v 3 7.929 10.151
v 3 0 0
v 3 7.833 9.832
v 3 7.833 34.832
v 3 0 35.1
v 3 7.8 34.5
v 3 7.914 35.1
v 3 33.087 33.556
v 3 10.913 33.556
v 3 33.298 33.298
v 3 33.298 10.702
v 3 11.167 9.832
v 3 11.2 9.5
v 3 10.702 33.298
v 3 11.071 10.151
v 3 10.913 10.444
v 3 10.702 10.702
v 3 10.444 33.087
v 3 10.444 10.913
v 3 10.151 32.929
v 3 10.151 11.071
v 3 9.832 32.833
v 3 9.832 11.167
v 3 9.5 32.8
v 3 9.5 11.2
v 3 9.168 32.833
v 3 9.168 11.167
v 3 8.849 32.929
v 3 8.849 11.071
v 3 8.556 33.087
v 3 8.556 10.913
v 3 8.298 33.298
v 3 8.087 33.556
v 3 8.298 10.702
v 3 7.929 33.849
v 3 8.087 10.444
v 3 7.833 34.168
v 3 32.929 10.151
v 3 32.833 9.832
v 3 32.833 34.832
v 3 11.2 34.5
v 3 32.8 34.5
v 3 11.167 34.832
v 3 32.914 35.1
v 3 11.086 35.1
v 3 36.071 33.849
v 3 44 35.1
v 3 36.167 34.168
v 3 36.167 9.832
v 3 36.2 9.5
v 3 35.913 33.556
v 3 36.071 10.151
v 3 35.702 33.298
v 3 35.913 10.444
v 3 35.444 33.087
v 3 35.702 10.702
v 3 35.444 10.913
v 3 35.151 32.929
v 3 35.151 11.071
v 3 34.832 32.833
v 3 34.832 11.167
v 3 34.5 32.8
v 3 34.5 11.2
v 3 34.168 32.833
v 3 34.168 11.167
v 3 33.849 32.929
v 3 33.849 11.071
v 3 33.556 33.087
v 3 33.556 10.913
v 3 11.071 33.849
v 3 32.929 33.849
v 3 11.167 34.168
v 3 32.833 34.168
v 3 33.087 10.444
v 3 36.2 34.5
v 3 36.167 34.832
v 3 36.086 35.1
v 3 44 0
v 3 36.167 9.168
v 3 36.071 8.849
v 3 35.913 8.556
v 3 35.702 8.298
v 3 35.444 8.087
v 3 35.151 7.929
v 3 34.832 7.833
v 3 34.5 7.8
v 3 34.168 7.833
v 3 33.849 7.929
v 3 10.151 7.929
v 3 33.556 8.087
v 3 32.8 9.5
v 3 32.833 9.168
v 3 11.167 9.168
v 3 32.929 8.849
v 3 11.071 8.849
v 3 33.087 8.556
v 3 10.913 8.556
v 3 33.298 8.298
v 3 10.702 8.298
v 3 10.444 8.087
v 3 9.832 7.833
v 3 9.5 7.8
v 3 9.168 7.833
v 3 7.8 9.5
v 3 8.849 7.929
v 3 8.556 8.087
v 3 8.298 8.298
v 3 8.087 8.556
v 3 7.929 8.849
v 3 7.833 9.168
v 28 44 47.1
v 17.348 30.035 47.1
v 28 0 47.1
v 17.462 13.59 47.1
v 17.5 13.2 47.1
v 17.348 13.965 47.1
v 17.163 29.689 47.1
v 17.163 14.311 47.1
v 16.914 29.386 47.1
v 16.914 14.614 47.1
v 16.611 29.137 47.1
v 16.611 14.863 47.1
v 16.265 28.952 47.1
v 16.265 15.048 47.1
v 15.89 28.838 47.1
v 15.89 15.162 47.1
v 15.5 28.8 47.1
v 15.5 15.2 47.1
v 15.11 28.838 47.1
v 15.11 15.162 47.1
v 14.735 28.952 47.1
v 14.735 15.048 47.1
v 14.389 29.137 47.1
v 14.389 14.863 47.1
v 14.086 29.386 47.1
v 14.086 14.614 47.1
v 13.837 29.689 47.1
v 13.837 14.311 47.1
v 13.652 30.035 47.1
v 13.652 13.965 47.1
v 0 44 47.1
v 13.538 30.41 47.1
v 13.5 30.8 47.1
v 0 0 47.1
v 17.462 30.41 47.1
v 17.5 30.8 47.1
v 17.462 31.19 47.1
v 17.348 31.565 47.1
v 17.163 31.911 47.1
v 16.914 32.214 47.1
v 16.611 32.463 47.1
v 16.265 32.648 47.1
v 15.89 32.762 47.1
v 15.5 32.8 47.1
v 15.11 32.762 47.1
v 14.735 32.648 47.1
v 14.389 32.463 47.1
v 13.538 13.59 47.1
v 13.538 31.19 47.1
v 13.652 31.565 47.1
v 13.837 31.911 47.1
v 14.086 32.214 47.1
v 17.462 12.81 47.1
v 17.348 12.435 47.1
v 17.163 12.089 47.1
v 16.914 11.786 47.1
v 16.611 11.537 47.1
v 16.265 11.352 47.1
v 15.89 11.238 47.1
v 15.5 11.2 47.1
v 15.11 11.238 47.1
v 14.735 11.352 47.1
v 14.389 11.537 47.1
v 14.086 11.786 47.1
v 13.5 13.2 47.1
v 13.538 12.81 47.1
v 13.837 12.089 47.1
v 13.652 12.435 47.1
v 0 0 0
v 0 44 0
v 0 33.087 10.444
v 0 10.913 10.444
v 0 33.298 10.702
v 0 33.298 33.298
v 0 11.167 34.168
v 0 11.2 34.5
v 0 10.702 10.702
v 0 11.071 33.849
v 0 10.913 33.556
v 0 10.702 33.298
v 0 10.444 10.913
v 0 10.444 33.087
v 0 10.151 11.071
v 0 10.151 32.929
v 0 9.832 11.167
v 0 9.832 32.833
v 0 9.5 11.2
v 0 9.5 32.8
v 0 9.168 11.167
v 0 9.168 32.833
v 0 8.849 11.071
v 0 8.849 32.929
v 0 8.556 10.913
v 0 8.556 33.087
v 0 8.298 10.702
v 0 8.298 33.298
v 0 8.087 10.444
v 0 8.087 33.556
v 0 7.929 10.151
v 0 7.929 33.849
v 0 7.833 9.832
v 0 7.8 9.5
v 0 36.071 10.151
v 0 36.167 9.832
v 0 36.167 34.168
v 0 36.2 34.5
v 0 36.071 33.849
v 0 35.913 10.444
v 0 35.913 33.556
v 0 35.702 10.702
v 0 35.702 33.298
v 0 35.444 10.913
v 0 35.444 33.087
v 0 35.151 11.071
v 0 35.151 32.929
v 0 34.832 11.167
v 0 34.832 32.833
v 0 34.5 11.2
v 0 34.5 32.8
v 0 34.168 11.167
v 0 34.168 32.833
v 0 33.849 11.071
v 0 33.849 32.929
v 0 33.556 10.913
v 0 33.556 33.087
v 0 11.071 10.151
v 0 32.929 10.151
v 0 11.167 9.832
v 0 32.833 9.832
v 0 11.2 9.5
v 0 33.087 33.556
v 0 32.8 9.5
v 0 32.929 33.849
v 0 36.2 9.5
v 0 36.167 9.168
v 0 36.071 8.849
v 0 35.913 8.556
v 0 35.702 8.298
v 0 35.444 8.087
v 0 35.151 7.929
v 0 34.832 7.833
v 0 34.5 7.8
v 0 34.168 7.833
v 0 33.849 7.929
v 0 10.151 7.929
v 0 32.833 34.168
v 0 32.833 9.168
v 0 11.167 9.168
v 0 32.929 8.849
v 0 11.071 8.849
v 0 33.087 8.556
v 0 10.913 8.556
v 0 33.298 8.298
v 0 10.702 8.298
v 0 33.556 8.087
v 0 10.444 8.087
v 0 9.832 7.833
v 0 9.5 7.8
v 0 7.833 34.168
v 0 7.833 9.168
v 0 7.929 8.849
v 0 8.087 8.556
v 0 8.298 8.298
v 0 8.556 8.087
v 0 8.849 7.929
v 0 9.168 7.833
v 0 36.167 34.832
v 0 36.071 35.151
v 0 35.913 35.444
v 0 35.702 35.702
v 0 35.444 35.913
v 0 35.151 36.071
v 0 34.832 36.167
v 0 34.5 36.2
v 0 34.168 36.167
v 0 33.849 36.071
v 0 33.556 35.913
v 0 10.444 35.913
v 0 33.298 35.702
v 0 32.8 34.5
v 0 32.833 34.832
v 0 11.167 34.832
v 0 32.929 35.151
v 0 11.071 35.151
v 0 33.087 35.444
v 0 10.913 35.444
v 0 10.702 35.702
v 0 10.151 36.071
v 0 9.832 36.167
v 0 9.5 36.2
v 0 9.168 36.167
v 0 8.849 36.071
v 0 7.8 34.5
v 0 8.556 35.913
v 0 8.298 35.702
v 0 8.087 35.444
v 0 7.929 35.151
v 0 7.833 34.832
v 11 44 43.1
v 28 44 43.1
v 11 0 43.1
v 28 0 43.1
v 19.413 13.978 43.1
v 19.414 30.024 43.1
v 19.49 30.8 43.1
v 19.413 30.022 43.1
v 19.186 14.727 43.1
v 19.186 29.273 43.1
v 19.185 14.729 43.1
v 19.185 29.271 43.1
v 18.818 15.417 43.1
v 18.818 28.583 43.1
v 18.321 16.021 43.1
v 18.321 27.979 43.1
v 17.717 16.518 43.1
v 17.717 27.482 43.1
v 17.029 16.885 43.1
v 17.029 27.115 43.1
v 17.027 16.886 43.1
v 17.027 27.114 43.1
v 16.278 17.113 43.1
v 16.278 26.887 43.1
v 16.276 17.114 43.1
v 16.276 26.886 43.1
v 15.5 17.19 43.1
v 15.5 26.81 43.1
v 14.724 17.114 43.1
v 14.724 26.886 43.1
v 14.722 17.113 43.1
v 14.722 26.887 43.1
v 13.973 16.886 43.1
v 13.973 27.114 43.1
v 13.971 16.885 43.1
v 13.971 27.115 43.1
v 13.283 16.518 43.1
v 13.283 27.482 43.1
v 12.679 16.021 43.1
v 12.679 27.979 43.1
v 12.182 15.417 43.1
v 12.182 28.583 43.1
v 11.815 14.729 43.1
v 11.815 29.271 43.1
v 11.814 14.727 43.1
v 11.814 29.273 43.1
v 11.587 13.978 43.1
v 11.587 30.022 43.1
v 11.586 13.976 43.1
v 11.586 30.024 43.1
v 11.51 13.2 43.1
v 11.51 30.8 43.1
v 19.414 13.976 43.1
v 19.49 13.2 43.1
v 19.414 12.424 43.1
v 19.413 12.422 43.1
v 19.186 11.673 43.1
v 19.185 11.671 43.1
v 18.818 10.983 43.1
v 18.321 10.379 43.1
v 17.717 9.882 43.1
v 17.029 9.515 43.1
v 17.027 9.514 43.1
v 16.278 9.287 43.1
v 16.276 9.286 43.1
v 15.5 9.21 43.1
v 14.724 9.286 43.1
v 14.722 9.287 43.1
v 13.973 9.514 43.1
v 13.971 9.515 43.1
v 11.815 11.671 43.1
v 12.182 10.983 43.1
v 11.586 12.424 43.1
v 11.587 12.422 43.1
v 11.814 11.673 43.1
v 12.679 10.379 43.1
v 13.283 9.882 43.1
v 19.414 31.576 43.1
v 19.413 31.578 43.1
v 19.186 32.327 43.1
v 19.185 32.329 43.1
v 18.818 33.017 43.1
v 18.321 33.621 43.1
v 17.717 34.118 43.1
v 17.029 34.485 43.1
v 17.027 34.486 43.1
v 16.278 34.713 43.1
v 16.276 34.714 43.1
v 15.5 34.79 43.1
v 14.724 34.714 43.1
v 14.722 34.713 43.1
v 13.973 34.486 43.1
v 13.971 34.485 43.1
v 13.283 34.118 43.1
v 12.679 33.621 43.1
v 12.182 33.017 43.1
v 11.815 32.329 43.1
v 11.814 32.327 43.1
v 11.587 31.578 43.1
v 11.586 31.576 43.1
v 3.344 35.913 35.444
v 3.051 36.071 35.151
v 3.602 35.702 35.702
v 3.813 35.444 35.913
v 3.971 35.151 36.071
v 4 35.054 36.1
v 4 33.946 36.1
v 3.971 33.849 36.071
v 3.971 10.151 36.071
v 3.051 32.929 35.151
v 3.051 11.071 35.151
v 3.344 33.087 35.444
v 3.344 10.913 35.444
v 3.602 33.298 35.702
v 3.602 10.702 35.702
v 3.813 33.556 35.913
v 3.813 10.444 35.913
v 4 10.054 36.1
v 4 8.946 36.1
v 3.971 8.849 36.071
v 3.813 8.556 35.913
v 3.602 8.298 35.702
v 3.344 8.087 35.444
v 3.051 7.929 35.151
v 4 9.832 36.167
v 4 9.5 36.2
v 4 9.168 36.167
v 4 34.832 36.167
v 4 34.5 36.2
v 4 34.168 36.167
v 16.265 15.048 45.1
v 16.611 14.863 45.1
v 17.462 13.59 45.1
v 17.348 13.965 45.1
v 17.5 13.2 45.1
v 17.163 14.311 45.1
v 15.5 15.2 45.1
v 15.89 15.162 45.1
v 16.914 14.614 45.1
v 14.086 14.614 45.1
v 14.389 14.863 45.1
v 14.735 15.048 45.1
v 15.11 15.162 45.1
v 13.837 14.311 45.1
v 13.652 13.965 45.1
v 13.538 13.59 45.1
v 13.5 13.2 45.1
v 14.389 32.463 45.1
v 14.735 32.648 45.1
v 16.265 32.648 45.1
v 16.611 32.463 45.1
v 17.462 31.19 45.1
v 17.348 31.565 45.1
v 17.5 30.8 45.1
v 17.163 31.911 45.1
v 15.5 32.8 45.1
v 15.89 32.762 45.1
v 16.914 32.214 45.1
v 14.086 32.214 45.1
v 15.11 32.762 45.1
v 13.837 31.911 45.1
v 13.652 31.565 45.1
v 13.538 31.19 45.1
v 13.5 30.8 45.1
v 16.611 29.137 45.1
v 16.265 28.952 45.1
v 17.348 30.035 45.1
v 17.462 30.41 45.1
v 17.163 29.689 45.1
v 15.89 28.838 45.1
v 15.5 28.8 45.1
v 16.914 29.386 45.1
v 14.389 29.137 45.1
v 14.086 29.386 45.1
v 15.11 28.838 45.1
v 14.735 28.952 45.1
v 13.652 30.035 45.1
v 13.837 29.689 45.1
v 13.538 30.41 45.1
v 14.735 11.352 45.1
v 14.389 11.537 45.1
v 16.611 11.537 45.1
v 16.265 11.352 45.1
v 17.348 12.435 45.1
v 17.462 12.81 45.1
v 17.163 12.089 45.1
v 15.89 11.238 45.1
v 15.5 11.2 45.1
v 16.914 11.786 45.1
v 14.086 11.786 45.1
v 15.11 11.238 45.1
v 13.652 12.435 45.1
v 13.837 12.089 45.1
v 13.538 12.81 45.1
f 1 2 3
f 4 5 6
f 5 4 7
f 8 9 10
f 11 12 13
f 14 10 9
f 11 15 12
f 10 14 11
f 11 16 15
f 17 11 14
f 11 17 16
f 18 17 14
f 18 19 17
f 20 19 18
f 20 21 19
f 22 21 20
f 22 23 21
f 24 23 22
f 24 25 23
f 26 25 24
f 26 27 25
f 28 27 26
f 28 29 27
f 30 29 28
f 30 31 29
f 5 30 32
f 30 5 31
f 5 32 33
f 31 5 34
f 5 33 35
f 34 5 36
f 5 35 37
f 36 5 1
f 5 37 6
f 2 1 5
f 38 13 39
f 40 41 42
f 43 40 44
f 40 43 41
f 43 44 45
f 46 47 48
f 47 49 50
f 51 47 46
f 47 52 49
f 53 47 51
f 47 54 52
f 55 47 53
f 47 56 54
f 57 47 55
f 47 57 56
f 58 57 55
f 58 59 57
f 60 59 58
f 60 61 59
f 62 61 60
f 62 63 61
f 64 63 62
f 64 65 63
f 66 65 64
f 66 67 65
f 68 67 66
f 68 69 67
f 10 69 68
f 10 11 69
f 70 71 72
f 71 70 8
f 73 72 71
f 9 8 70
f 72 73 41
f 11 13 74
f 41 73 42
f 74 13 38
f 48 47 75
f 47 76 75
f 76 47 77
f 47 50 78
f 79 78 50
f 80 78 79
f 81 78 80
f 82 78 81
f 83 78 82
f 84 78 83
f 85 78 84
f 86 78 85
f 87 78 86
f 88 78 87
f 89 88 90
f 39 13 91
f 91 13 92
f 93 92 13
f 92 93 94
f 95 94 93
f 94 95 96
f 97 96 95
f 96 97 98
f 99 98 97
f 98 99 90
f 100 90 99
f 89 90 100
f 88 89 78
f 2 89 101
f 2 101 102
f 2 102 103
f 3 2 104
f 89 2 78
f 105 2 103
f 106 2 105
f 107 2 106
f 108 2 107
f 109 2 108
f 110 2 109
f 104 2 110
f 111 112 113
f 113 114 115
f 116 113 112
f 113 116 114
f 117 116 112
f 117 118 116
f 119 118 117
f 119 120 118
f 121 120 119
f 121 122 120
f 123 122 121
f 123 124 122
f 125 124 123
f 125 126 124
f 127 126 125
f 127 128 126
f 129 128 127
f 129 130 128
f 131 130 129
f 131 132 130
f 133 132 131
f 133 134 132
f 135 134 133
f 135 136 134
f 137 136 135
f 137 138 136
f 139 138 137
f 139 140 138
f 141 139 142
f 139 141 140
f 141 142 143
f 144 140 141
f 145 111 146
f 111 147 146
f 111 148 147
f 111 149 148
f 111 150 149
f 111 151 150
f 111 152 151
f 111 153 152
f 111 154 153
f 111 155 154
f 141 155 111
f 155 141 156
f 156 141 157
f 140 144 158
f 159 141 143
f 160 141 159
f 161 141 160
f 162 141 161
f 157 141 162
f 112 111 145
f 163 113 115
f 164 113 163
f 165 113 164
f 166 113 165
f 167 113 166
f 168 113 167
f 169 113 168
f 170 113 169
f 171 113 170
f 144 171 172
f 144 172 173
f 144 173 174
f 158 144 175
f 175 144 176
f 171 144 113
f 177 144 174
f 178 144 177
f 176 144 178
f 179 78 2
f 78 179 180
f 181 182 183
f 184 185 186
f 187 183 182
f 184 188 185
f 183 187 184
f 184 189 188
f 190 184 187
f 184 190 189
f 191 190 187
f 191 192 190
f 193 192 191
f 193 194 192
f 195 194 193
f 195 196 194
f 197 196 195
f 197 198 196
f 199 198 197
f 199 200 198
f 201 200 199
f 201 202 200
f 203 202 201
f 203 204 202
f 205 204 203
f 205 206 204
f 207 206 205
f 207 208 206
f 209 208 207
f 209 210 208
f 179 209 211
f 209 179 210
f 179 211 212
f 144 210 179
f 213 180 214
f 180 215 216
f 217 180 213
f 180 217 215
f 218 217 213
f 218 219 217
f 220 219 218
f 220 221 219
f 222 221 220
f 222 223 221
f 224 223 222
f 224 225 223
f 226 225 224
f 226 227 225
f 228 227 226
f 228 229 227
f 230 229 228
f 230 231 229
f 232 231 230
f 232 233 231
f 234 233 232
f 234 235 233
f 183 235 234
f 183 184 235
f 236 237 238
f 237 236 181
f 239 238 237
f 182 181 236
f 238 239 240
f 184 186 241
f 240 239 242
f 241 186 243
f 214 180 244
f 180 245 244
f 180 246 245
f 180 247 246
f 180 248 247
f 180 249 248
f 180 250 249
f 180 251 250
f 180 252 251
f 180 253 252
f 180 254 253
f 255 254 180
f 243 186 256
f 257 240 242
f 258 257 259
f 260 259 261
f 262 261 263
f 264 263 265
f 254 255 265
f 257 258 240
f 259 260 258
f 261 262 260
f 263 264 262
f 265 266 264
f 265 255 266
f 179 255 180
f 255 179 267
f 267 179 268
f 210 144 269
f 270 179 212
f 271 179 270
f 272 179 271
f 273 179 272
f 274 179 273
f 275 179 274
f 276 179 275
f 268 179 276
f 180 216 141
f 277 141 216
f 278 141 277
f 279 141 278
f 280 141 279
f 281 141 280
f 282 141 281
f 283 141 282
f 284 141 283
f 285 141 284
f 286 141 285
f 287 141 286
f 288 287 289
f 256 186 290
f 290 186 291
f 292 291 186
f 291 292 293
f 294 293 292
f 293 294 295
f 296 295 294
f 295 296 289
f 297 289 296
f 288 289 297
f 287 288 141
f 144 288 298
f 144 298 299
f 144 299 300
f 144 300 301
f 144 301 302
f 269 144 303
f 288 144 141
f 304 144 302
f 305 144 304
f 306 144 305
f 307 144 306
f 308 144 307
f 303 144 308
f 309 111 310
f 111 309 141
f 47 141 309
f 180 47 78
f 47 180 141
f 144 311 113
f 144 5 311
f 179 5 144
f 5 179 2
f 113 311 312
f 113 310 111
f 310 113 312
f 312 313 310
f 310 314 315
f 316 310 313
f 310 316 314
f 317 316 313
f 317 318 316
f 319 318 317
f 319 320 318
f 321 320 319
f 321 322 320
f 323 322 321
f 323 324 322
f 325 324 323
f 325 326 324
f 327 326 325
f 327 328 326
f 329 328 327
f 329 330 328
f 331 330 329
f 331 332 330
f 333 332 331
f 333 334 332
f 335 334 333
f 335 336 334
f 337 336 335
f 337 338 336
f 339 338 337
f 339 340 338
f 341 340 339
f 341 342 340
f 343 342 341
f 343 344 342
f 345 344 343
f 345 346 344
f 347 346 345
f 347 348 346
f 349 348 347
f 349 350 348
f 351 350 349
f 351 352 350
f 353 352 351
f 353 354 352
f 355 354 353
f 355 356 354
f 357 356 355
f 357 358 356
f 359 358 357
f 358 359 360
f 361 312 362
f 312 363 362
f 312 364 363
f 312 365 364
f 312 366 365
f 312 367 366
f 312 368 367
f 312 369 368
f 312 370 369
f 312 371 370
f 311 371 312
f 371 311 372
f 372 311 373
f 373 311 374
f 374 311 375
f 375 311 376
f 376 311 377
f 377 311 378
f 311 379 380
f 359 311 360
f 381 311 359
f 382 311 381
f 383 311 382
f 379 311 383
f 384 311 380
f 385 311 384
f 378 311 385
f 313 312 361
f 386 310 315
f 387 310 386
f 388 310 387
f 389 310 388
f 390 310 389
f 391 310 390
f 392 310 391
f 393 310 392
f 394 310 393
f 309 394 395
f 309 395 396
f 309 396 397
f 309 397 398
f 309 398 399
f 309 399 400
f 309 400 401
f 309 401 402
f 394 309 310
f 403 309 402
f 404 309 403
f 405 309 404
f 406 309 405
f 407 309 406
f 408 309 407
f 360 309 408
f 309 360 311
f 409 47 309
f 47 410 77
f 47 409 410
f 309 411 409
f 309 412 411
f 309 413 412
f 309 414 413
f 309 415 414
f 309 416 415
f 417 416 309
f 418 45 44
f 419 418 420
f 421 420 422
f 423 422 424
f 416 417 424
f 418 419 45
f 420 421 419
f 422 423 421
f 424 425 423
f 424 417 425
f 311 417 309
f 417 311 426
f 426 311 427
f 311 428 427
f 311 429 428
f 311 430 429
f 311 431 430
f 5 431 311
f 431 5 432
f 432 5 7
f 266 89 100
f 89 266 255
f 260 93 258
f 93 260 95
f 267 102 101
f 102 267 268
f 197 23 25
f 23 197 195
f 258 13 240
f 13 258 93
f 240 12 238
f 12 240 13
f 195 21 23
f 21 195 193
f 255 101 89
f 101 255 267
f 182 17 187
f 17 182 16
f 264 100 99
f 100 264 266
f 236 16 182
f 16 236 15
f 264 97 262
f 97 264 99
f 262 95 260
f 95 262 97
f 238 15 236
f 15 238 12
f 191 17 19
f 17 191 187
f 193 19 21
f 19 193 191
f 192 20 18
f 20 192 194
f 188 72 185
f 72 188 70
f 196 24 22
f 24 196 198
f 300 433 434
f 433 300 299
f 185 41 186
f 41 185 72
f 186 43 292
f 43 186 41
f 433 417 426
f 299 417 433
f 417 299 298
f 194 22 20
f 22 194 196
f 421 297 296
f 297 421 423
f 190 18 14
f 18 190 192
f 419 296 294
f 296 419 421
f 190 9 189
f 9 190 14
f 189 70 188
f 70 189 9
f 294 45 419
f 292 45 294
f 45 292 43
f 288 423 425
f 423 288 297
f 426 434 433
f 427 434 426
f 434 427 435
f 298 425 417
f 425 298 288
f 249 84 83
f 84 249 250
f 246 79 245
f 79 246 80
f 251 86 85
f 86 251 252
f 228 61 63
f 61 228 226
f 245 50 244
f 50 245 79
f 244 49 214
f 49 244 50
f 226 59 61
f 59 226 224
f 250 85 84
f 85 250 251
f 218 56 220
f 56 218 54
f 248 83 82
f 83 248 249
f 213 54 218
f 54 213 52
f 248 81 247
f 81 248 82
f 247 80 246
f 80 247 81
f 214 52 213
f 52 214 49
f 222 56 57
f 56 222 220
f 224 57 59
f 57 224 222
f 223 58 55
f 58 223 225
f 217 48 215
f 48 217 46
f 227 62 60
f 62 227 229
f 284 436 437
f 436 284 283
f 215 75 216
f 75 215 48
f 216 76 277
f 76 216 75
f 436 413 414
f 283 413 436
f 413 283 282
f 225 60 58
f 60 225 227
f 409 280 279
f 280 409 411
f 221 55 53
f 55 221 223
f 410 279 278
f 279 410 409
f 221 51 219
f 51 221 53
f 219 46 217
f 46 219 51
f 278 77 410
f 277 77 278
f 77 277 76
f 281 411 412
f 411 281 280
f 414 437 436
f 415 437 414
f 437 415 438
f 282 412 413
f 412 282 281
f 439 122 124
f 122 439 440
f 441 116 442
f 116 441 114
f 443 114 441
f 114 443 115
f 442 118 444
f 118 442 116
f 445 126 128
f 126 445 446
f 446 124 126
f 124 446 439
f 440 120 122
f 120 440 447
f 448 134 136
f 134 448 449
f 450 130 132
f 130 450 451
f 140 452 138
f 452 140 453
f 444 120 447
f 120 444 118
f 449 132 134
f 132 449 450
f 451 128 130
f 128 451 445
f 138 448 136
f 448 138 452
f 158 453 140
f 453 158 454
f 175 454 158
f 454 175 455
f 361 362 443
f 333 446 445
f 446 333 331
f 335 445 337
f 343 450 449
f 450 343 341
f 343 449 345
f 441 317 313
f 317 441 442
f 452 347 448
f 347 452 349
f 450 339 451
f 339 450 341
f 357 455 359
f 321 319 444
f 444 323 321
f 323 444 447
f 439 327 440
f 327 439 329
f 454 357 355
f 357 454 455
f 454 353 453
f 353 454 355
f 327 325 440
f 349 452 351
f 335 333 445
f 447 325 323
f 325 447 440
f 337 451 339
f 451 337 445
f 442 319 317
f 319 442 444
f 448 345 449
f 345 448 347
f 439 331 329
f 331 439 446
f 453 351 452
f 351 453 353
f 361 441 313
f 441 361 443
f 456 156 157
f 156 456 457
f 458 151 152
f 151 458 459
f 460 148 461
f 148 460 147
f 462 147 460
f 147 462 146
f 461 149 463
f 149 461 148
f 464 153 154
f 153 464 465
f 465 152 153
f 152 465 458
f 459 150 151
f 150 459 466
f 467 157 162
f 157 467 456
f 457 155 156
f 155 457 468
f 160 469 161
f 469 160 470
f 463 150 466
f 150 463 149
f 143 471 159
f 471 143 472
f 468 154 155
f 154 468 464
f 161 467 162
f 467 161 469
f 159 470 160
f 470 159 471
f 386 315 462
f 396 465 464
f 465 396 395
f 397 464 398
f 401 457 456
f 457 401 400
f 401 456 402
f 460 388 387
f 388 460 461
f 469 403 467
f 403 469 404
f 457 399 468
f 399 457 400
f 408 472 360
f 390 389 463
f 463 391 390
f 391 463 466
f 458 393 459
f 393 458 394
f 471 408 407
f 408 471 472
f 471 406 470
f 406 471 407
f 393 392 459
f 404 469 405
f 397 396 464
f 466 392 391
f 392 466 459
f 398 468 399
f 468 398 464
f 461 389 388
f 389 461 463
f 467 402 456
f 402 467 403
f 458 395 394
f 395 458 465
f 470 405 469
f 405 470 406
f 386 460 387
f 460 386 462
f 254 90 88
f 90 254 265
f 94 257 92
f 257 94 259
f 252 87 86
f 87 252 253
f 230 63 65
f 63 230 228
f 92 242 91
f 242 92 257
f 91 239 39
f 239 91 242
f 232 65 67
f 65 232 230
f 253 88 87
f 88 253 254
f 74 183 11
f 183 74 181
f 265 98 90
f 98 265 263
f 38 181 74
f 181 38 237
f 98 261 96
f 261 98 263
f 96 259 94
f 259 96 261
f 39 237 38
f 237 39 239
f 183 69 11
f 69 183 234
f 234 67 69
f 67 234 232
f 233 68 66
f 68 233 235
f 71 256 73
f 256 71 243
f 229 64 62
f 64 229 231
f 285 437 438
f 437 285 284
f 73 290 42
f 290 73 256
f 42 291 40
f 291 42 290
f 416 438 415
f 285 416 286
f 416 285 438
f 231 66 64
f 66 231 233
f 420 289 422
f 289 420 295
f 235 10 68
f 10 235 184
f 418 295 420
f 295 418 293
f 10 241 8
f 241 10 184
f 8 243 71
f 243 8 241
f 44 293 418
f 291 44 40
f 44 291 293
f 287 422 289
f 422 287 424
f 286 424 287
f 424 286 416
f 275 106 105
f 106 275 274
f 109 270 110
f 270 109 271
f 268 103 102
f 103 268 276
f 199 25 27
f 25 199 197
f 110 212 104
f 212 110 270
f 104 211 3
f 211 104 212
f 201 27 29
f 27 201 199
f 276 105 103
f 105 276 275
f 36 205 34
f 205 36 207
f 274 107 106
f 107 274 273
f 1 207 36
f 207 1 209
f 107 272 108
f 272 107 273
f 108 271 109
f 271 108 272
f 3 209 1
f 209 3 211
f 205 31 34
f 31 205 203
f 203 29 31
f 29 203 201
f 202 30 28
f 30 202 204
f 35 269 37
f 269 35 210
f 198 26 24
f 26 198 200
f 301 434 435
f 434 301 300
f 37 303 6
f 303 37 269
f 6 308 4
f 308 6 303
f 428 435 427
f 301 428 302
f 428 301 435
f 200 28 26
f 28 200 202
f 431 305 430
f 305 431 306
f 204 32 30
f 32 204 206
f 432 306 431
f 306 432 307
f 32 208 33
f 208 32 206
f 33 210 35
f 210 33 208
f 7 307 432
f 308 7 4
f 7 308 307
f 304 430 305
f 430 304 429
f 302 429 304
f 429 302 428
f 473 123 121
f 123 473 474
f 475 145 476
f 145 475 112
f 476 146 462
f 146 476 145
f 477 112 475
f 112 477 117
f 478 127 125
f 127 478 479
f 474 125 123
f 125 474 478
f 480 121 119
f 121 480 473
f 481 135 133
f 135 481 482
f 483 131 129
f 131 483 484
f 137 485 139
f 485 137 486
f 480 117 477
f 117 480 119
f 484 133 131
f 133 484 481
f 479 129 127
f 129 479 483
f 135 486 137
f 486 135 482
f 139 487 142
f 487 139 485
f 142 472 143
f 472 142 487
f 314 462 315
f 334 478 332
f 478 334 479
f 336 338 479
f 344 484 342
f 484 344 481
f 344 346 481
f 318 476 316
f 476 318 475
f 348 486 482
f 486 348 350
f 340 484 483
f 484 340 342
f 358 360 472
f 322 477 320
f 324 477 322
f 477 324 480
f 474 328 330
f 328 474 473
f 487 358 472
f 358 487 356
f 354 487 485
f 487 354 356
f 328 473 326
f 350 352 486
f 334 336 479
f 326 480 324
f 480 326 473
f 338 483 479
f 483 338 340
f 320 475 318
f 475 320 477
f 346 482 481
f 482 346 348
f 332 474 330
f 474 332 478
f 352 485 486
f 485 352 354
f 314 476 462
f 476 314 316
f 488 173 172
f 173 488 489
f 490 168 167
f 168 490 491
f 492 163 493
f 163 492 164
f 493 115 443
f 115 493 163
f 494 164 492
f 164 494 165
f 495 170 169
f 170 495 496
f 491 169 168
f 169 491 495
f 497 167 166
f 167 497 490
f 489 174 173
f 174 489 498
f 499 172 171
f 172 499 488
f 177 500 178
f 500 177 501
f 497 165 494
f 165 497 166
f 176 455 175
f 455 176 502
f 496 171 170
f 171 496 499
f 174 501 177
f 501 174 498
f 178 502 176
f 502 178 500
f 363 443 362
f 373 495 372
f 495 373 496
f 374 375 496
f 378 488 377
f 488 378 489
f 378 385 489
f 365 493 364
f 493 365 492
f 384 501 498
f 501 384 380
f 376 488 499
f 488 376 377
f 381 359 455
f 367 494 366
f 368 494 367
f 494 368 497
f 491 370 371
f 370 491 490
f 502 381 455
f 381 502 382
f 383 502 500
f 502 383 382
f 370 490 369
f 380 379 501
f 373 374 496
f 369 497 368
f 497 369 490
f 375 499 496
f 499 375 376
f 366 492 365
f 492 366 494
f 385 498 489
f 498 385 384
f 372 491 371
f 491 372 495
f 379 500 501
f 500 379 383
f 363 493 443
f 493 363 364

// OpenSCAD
// SPDX-License-Identifier: CC-BY-NC-SA-4.0
use <../css610-underdesk-mount.scad>;

// Data asserts verify device dimensions.
assert(len(_css610_side_holes()) == 4, "CSS610 side pattern = 4 holes");
assert(_css610_size()[2] == 47.1, "CSS610 height (flange datum)");

// Task 2 (#59): bracket geometry contract checks. `use` doesn't import
// variables (only modules/functions, see reference_openscad_gotchas) -- the
// module-parameter values below (_leg_len, _H, _standoff, _leg_thickness,
// _flange_len, _flange_thickness, _mount_hole) are regression-lock literals
// that must match css610-underdesk-mount.scad's own defaults/formula, not an
// independently-sourced value. If a future default change is deliberate,
// update these to match; if it's accidental, this assert catches the drift.
_leg_len = 34.5 + 9.5;      // 44: leg span, matches the module's own formula
_H = _css610_size()[2];     // 47.1
_standoff = 0;              // must match css610-underdesk-mount.scad default
_leg_thickness = 3;
_flange_len = 25;
_flange_thickness = 4;
_mount_hole_r = 3.4 / 2;

// Contract: 4 M3 leg holes align to _css610_side_holes(), each landing
// strictly inside the leg footprint (Y in [0,_leg_len], Z in [0,_H+_standoff])
// with its own radius clearing both edges (no partial/blown-out hole).
holes = _css610_side_holes();
assert(len(holes) == 4, str("expected 4 leg holes, got ", len(holes)));
for (h = holes) {
    assert(h[0] - _mount_hole_r > 0 && h[0] + _mount_hole_r < _leg_len,
        str("leg hole X=", h[0], " (r=", _mount_hole_r, ") does not clear leg Y-span [0,", _leg_len, "]"));
    assert(h[1] - _mount_hole_r > 0 && h[1] + _mount_hole_r < _H + _standoff,
        str("leg hole Z=", h[1], " (r=", _mount_hole_r, ") does not clear leg Z-span [0,", _H + _standoff, "]"));
}

// Contract: flange top is coplanar with the device top (flush-mount datum).
// NOT checked here -- an algebraic re-derivation from the module's own
// z0/height formula would be a tautology (always true regardless of what
// the module actually computes) and provide zero real verification. The
// real, mesh-derived check lives in tests/test_css610_underdesk_mount.sh's
// STL bbox check (Z-max == H+standoff == 47.1), which DOES catch a wrong
// formula (e.g. the gusset-overshoot bug caught during Task 2 review).

// Contract: 2 flange wood-screw holes, spaced within the flange span, and
// centered past the device edge (X0 = leg_thickness + flange_len/2 >
// leg_thickness) so they clear the device.
for (fy = [_leg_len * 0.3, _leg_len * 0.7])
    assert(fy - _mount_hole_r > 0 && fy + _mount_hole_r < _leg_len,
        str("flange hole Y=", fy, " does not clear leg Y-span [0,", _leg_len, "]"));
assert(_leg_thickness + _flange_len / 2 > _leg_thickness,
    "flange holes must clear the device edge (X > leg_thickness)");

// Contract (Task 3, #59): the bracket must clear the device's PHYSICAL
// envelope, not just the formal X>leg_thickness rule above. Device sits at
// X in [-_css610_size()[0], 0] flush against the leg (see the module's
// fit-viz comment / task-3-report.md verify-scad-geometry render); the
// wood-screw hole (max radius csk_dia/2=4 at its countersink mouth) must
// not cross X=0 into the device.
_csk_dia = 8;   // must match css610-underdesk-mount.scad's own csk_dia default (`use` scope, see note above)
_csk_r = _csk_dia / 2;
assert(_leg_thickness + _flange_len / 2 - _csk_r > 0,
    "flange wood-screw hole (incl. countersink) must clear the device's physical X<=0 envelope");

// L/R mirror (Task 3, #59): side="L" must render without error, and --
// because _css610_side_holes()'s Y-values (9.5, 34.5) and the wood-screw
// Y-positions (leg_len*0.3, leg_len*0.7 = 13.2, 30.8) are each symmetric
// about leg_len/2=22 -- mirroring in Y (44-y) must map each hole set onto
// itself, confirming both L and R variants align to the same device hole
// pattern (verified algebraically here; mesh-level confirmation in
// tests/test_css610_underdesk_mount.sh's L-side hole-void probes).
function _in_set(v, list) = len([for (x = list) if (abs(x - v) < 1e-9) x]) > 0;

_hole_ys = [for (h = holes) h[0]]; // [9.5, 34.5, 9.5, 34.5]
for (y = _hole_ys)
    assert(_in_set(_leg_len - y, _hole_ys),
        str("mirrored M3 hole Y=", _leg_len - y, " (from Y=", y, ") not in original hole-Y set ",
            _hole_ys, " -- L/R mirror would misalign the M3 holes"));

_wood_ys = [_leg_len * 0.3, _leg_len * 0.7]; // [13.2, 30.8]
for (y = _wood_ys)
    assert(_in_set(_leg_len - y, _wood_ys),
        str("mirrored wood-screw hole Y=", _leg_len - y, " (from Y=", y, ") not in original set ",
            _wood_ys, " -- L/R mirror would misalign the wood-screw holes"));

// Bracket render (Task 2/3): drives the geometry contract above + the STL
// bbox checks in tests/test_css610_underdesk_mount.sh. Both L and R render
// here to prove the `side` param produces valid geometry for each.
css610_underdesk_bracket(side = "R");
css610_underdesk_bracket(side = "L");
